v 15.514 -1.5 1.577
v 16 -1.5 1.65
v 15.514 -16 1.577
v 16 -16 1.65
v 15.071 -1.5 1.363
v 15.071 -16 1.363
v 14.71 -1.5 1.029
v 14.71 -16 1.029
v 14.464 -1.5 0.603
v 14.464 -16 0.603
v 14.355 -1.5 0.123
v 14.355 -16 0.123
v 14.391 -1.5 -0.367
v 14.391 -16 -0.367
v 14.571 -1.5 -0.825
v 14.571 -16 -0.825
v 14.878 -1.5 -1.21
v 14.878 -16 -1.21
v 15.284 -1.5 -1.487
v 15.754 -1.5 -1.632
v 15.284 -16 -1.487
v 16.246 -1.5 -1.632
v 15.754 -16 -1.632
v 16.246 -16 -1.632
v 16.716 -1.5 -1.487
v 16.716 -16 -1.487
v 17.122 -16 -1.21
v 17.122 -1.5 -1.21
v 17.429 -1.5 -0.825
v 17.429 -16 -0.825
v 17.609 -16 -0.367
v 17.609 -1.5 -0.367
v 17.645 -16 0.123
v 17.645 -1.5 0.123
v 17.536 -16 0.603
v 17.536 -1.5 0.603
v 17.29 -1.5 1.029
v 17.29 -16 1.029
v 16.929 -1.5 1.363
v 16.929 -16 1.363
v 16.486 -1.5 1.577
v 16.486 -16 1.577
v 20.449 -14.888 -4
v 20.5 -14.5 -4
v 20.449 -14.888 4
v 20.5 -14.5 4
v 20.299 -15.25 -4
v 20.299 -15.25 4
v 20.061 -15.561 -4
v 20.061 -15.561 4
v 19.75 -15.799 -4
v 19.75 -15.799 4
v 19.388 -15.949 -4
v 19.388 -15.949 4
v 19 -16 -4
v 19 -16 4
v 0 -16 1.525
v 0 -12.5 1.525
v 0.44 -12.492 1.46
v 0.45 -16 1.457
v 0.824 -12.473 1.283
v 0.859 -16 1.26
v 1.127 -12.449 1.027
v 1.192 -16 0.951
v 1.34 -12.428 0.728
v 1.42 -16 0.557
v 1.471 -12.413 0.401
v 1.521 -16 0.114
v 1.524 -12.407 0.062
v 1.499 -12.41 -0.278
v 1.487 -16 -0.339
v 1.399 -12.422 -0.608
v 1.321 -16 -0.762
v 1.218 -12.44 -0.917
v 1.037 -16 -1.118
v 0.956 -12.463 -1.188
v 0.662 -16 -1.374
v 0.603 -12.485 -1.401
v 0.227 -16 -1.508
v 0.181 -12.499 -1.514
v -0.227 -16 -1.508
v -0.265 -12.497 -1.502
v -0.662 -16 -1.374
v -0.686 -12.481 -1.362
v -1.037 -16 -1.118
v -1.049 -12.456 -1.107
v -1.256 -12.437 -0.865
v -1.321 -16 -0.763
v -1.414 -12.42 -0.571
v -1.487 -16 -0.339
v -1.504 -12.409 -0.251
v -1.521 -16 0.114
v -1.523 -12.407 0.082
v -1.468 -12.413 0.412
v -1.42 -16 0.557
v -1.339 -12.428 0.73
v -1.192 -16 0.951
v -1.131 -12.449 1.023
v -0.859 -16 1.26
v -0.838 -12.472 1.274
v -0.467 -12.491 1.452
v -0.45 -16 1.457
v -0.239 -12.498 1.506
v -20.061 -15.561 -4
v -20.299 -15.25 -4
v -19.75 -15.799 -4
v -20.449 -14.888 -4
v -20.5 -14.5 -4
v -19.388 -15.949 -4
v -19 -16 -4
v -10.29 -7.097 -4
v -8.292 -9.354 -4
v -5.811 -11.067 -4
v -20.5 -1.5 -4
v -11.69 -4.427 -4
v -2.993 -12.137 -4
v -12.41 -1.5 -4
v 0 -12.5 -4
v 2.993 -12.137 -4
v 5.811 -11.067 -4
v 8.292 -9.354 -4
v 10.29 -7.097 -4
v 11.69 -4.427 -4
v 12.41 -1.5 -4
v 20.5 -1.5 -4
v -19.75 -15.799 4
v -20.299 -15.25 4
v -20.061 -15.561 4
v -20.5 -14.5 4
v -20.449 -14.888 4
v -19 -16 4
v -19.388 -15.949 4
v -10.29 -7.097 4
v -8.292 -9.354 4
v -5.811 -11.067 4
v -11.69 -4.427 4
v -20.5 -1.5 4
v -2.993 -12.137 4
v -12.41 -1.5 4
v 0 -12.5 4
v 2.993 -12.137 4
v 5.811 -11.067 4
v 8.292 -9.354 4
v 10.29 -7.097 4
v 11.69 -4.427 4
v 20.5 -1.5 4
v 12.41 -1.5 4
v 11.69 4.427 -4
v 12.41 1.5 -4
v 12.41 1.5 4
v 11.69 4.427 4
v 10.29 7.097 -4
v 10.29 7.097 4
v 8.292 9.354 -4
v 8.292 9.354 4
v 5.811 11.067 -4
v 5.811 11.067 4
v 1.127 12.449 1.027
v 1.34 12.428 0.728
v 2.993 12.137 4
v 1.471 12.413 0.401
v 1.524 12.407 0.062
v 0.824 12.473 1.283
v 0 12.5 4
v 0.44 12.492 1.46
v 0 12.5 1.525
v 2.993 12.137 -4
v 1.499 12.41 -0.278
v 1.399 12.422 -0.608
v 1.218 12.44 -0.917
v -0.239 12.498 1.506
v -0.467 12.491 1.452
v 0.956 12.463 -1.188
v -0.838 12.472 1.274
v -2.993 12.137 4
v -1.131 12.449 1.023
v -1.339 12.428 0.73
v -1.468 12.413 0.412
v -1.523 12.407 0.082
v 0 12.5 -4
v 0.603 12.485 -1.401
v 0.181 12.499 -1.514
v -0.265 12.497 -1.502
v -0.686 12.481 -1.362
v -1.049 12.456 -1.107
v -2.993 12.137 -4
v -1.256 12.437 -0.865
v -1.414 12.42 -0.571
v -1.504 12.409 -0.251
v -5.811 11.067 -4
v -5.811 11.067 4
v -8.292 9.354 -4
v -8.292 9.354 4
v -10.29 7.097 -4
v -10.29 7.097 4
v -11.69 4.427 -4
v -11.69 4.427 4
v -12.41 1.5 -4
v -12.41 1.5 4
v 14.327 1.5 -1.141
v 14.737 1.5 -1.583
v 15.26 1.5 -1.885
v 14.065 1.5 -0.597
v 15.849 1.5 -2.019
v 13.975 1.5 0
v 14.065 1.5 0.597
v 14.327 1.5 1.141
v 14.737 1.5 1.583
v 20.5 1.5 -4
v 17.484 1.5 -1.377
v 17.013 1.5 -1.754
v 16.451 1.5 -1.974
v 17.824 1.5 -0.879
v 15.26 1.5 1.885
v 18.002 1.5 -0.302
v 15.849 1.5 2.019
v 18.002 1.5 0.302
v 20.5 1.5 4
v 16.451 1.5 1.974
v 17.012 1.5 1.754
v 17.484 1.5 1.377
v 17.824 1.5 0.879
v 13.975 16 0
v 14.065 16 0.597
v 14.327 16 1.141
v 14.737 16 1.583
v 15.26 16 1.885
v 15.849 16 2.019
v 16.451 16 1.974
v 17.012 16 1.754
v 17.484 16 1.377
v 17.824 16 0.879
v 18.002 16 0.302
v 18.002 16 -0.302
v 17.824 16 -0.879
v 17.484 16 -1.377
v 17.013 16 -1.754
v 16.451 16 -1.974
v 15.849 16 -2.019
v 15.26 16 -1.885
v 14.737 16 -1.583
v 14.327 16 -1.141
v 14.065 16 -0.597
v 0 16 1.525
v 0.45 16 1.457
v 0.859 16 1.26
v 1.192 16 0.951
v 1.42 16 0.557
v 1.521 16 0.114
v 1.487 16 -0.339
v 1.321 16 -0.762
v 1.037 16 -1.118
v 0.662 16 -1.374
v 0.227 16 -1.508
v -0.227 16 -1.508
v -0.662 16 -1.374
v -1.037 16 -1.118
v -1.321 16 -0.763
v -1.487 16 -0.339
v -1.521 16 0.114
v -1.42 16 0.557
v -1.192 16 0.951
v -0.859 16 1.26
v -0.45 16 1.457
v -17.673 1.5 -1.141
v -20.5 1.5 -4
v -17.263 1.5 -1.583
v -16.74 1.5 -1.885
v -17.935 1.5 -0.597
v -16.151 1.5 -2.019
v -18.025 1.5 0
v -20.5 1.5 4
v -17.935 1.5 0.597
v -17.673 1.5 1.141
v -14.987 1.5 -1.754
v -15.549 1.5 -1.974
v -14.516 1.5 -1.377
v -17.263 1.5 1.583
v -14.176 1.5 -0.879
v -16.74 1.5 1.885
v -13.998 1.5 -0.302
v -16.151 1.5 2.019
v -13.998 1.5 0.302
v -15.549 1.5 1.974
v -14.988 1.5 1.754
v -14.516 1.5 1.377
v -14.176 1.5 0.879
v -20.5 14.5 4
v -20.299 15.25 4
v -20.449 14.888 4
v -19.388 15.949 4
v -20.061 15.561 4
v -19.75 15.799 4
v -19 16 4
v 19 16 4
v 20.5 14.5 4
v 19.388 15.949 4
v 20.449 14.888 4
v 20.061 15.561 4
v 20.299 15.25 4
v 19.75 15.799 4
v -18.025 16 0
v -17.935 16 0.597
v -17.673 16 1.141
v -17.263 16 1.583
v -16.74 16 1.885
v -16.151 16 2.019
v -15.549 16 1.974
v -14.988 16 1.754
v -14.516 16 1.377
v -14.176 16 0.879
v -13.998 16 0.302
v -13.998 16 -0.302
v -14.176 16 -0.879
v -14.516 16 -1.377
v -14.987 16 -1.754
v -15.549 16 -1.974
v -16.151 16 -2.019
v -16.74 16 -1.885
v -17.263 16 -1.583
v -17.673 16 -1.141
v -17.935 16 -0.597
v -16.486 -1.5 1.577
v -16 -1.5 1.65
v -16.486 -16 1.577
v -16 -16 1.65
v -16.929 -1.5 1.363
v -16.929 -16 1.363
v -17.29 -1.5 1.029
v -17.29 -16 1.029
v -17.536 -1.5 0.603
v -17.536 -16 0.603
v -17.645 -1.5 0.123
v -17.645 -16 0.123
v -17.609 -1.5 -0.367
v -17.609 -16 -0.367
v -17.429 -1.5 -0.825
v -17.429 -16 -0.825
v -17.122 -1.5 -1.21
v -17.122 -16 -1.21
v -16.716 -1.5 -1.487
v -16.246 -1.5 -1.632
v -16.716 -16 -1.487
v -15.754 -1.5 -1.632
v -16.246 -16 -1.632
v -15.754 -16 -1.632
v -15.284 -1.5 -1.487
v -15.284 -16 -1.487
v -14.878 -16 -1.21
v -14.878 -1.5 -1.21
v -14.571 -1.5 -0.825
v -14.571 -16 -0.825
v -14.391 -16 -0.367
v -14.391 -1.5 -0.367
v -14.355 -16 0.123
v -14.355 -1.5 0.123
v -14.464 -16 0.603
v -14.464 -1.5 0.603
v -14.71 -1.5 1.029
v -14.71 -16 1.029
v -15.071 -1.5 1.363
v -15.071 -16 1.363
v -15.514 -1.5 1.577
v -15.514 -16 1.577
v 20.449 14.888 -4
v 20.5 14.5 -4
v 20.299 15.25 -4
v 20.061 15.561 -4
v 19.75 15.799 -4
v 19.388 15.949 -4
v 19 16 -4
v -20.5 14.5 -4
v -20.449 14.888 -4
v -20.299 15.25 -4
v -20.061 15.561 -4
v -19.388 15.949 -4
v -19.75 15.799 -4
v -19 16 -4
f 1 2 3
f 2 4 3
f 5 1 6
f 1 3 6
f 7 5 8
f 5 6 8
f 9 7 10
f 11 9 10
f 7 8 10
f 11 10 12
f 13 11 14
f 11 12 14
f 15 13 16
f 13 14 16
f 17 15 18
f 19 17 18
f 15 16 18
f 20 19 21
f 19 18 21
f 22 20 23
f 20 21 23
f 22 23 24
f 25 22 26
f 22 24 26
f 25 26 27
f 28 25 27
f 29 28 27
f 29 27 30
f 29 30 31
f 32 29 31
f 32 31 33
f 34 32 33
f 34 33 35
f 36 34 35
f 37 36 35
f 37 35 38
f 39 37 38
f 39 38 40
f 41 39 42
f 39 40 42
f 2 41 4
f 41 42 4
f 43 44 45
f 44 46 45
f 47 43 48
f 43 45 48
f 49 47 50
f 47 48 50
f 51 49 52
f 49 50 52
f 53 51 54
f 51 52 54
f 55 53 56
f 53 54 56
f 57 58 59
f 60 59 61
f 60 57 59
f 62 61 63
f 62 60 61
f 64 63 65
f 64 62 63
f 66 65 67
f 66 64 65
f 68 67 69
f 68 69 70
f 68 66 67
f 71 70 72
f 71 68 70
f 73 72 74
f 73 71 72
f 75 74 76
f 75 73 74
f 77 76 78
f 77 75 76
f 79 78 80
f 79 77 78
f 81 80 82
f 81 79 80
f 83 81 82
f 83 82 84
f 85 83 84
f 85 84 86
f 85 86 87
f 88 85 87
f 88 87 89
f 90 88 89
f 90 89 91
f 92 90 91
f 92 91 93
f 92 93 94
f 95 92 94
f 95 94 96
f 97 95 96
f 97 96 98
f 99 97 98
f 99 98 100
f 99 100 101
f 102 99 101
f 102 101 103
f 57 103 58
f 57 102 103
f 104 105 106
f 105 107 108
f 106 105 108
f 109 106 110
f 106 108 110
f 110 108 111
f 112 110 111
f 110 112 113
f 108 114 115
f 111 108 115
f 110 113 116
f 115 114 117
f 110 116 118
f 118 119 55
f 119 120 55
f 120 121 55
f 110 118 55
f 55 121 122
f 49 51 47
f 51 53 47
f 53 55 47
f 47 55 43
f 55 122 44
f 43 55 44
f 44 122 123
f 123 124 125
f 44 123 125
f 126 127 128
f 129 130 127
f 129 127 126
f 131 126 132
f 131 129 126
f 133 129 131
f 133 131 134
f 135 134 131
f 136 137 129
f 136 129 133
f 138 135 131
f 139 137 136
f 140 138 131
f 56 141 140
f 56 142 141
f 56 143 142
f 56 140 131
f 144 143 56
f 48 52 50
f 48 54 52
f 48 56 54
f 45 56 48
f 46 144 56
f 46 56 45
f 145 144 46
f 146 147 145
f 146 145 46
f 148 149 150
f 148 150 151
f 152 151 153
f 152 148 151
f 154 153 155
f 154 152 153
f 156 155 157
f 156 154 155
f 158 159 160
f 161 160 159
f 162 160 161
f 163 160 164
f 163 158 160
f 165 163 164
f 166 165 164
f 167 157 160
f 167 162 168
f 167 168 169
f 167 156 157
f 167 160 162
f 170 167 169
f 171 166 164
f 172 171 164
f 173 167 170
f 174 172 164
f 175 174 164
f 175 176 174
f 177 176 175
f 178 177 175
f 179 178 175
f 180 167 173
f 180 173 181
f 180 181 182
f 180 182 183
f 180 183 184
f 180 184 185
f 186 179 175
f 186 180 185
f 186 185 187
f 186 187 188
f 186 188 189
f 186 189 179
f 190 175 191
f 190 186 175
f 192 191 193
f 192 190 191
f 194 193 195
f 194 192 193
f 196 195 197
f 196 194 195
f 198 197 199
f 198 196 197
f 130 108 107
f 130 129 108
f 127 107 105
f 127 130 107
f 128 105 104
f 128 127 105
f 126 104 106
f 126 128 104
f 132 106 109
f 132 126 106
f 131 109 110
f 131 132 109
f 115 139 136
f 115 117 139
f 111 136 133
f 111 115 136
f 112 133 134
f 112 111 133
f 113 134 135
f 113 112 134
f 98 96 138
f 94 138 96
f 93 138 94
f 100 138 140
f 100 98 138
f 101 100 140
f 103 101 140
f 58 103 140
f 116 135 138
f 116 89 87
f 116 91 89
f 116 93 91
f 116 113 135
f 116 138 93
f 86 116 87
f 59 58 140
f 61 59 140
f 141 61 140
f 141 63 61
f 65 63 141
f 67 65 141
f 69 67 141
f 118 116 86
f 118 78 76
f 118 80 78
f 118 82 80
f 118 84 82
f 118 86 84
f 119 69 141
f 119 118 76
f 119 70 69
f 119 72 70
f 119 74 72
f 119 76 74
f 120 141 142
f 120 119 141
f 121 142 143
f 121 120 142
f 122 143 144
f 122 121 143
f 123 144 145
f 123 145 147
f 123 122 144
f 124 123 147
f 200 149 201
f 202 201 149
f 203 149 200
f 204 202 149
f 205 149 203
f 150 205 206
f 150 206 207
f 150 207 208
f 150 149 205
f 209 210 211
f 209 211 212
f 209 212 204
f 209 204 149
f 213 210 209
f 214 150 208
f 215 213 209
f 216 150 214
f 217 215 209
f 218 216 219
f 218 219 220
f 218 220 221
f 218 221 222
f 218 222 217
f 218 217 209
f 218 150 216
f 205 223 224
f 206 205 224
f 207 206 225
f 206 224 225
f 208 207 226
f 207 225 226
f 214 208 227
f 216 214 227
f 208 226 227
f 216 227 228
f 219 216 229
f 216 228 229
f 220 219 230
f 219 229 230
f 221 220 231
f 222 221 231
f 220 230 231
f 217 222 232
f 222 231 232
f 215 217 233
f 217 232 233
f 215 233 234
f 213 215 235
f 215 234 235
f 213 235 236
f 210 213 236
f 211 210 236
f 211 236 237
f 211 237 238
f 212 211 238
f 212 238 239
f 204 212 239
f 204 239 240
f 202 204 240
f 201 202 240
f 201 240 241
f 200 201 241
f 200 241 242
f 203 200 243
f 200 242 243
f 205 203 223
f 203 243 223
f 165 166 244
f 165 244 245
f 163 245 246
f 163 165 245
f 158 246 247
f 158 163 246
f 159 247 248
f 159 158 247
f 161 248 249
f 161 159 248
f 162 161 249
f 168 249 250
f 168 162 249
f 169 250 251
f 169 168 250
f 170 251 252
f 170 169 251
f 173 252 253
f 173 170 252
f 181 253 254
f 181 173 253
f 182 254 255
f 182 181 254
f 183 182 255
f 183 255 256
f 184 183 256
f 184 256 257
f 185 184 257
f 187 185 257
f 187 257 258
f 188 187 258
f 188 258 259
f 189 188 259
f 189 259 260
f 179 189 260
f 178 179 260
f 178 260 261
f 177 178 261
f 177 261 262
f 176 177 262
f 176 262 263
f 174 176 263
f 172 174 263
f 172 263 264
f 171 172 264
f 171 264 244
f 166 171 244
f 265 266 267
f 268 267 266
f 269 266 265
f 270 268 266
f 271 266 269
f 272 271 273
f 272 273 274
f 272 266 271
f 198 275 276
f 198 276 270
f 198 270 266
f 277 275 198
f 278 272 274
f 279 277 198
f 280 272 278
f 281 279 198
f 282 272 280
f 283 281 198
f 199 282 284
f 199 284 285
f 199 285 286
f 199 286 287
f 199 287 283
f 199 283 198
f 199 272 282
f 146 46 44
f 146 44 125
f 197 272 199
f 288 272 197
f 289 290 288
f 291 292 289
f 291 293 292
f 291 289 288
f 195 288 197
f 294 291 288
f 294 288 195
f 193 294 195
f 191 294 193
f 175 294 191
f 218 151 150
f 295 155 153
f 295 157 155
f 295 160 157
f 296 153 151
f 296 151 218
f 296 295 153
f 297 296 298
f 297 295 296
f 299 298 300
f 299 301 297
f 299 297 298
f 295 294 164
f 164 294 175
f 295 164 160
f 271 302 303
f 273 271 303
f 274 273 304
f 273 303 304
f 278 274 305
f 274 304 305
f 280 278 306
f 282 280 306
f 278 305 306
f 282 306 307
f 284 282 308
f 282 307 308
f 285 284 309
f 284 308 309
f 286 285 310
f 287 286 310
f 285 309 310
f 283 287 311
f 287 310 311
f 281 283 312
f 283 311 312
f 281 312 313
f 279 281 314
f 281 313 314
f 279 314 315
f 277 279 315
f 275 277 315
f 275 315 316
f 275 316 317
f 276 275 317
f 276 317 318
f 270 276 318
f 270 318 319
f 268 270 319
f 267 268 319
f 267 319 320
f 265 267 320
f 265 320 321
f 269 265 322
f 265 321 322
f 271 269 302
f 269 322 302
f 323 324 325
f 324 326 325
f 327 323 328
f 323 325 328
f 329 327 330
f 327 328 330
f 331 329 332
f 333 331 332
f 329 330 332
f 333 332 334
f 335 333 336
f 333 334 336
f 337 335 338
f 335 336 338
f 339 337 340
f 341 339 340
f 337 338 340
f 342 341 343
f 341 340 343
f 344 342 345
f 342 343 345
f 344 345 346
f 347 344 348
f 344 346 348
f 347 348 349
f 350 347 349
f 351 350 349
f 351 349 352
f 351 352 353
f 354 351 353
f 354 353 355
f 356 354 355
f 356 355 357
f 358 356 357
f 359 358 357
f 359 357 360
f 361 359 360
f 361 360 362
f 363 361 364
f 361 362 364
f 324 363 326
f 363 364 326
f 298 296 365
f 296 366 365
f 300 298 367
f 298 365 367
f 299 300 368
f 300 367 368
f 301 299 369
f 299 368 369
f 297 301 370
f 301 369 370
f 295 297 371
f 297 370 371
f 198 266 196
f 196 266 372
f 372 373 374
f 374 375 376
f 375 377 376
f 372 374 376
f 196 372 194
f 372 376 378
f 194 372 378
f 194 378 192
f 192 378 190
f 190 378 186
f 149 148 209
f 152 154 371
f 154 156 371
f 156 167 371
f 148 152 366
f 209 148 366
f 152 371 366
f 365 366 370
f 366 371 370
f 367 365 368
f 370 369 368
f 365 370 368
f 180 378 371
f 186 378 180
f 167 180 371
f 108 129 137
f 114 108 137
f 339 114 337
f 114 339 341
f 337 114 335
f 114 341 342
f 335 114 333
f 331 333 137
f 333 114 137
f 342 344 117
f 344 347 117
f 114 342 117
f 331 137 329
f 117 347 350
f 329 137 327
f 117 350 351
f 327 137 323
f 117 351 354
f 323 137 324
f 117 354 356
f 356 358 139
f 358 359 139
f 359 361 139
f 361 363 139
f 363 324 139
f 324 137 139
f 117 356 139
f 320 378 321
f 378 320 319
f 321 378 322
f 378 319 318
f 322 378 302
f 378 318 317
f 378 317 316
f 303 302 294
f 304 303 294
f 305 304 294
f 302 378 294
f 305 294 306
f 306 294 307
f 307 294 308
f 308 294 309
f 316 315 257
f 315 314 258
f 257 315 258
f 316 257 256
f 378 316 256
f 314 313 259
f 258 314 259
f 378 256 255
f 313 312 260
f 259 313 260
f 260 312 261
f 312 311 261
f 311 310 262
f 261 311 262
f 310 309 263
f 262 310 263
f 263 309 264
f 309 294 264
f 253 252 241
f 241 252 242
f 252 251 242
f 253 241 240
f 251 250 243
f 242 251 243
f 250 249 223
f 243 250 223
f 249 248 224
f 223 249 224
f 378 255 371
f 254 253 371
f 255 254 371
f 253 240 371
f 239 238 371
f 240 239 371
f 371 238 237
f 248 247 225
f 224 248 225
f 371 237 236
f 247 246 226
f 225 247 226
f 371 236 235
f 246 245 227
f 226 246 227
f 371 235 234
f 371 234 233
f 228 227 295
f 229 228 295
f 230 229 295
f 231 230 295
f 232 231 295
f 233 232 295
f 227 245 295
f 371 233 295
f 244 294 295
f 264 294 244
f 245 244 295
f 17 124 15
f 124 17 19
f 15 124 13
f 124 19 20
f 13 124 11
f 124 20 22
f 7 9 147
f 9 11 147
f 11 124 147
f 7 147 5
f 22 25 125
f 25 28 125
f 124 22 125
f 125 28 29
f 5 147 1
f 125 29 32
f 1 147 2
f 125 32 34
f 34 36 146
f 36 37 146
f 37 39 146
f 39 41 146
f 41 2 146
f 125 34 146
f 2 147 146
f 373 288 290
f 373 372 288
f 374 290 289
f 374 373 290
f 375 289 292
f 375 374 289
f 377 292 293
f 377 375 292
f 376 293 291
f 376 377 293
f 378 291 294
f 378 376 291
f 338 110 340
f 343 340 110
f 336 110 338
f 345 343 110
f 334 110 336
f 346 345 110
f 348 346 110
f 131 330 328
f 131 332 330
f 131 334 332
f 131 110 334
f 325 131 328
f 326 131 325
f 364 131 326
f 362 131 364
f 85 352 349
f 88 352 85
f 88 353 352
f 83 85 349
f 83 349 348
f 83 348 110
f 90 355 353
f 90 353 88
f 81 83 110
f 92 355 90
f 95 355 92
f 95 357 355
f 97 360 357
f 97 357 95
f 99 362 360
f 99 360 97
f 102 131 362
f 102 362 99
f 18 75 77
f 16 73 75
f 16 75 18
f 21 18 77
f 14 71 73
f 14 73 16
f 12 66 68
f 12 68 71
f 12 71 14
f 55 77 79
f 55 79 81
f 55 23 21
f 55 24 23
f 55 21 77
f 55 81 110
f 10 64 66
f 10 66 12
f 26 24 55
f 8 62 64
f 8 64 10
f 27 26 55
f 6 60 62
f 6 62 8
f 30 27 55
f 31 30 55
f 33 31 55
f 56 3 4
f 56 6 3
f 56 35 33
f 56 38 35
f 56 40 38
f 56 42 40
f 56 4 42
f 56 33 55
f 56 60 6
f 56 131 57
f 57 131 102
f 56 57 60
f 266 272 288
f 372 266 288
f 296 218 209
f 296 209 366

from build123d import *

# Parameters (mm, degrees)
SKETCH_1_W                  = 41
SKETCH_1_H                  = 32
SKETCH_1_R                  = 12.5
EXTRUDE_1_DEPTH             = 4
FILLET_1_R                  = 1.5
SKETCH_2_W                  = 51
SKETCH_2_H                  = 3
CUT_EXTRUDE_2_DEPTH         = 24
SKETCH_3_R                  = 2.025
CUT_EXTRUDE_3_DEPTH         = 14.5
SKETCH_5_W                  = 1.65
SKETCH_5_H                  = 14.5
HOLE_WIZARD_M4_1_AT_2_COUNT = 2
HOLE_WIZARD_M4_1_AT_2_PITCH = 32
CUT_EXTRUDE_START           = -32
SKETCH_6_R                  = 1.525
CUT_EXTRUDE_4_DEPTH         = 32


with BuildPart() as part:
    # 草图1 → 凸台-拉伸1 (new, symmetric)
    with BuildSketch(Plane.XY):
        Rectangle(SKETCH_1_W, SKETCH_1_H)
        Circle(SKETCH_1_R, mode=Mode.SUBTRACT)
    extrude(amount=EXTRUDE_1_DEPTH, both=True)

    # 圆角1
    fillet_1_edges = [part.edges().sort_by_distance(p)[0] for p in [
        (20.5, -16, 0),
        (-20.5, -16, 0),
        (-20.5, 16, 0),
        (20.5, 16, 0),
    ]]
    fillet(fillet_1_edges, radius=FILLET_1_R)

    # 草图2 → 切除-拉伸2 (cut, symmetric)
    with BuildSketch(Plane.XY.offset(4)):
        Rectangle(SKETCH_2_W, SKETCH_2_H)
    extrude(amount=CUT_EXTRUDE_2_DEPTH, both=True, mode=Mode.SUBTRACT)


with BuildPart() as cut_extrude_2_piece_1:
    # of the separate pieces the step leaves, piece 1, a body of its own (cut_extrude_2_pieces)
    add(part.part.solids().sort_by_distance((-19, -16, -4))[0])

    # 草图5 → M4 螺纹孔1 (revolve, cut)
    with BuildSketch(Plane(origin=(-16, -1.5, 0), x_dir=(0, 0, 1), z_dir=(1, 0, 0))):
        with Locations((0.825, 7.25)):
            Rectangle(SKETCH_5_W, SKETCH_5_H)
    hole_wizard_m4_1 = revolve(axis=Axis((-16, 4.85, 0), (0, -1, 0)), mode=Mode.SUBTRACT)

    # M4 螺纹孔1 at 2: M4 螺纹孔1 ×2
    with Locations(*[(i * HOLE_WIZARD_M4_1_AT_2_PITCH, 0, 0) for i in range(1, HOLE_WIZARD_M4_1_AT_2_COUNT)]):
        add(hole_wizard_m4_1, mode=Mode.SUBTRACT)


with BuildPart() as cut_extrude_2_piece_2:
    # of the separate pieces the step leaves, piece 2, a body of its own (cut_extrude_2_pieces)
    add(part.part.solids().sort_by_distance((-20.5, 14.5, -4))[0])

    # 草图3 → 切除-拉伸3 (cut)
    with BuildSketch(Plane(origin=(0, 16, 0), x_dir=(1, 0, 0), z_dir=(0, 1, 0))):
        with Locations(Location((16, 0, 0), (0, 0, 180))):
            Circle(SKETCH_3_R)
        with Locations(Location((-16, 0, 0), (0, 0, 180))):
            Circle(SKETCH_3_R)
    extrude(amount=-CUT_EXTRUDE_3_DEPTH, mode=Mode.SUBTRACT)


with BuildPart() as cut_extrude_4_tool:
    # 草图6 → 切除-拉伸4 (new body)
    with BuildSketch(Plane(origin=(0, 16, 0), x_dir=(1, 0, 0), z_dir=(0, 1, 0)).offset(CUT_EXTRUDE_START)):
        with Locations(Location((0, 0, 0), (0, 0, 270))):
            Circle(SKETCH_6_R)
    extrude(amount=CUT_EXTRUDE_4_DEPTH)


with BuildPart() as cut_extrude_2_piece_1_1:
    add(cut_extrude_2_piece_1.part)

    # 切除-拉伸4: cut by cut_extrude_4_tool
    add(cut_extrude_4_tool.part, mode=Mode.SUBTRACT)


with BuildPart() as cut_extrude_2_piece_2_1:
    add(cut_extrude_2_piece_2.part)

    # 切除-拉伸4: cut by cut_extrude_4_tool
    add(cut_extrude_4_tool.part, mode=Mode.SUBTRACT)


solid = Compound([cut_extrude_2_piece_1_1.part, cut_extrude_2_piece_2_1.part])
